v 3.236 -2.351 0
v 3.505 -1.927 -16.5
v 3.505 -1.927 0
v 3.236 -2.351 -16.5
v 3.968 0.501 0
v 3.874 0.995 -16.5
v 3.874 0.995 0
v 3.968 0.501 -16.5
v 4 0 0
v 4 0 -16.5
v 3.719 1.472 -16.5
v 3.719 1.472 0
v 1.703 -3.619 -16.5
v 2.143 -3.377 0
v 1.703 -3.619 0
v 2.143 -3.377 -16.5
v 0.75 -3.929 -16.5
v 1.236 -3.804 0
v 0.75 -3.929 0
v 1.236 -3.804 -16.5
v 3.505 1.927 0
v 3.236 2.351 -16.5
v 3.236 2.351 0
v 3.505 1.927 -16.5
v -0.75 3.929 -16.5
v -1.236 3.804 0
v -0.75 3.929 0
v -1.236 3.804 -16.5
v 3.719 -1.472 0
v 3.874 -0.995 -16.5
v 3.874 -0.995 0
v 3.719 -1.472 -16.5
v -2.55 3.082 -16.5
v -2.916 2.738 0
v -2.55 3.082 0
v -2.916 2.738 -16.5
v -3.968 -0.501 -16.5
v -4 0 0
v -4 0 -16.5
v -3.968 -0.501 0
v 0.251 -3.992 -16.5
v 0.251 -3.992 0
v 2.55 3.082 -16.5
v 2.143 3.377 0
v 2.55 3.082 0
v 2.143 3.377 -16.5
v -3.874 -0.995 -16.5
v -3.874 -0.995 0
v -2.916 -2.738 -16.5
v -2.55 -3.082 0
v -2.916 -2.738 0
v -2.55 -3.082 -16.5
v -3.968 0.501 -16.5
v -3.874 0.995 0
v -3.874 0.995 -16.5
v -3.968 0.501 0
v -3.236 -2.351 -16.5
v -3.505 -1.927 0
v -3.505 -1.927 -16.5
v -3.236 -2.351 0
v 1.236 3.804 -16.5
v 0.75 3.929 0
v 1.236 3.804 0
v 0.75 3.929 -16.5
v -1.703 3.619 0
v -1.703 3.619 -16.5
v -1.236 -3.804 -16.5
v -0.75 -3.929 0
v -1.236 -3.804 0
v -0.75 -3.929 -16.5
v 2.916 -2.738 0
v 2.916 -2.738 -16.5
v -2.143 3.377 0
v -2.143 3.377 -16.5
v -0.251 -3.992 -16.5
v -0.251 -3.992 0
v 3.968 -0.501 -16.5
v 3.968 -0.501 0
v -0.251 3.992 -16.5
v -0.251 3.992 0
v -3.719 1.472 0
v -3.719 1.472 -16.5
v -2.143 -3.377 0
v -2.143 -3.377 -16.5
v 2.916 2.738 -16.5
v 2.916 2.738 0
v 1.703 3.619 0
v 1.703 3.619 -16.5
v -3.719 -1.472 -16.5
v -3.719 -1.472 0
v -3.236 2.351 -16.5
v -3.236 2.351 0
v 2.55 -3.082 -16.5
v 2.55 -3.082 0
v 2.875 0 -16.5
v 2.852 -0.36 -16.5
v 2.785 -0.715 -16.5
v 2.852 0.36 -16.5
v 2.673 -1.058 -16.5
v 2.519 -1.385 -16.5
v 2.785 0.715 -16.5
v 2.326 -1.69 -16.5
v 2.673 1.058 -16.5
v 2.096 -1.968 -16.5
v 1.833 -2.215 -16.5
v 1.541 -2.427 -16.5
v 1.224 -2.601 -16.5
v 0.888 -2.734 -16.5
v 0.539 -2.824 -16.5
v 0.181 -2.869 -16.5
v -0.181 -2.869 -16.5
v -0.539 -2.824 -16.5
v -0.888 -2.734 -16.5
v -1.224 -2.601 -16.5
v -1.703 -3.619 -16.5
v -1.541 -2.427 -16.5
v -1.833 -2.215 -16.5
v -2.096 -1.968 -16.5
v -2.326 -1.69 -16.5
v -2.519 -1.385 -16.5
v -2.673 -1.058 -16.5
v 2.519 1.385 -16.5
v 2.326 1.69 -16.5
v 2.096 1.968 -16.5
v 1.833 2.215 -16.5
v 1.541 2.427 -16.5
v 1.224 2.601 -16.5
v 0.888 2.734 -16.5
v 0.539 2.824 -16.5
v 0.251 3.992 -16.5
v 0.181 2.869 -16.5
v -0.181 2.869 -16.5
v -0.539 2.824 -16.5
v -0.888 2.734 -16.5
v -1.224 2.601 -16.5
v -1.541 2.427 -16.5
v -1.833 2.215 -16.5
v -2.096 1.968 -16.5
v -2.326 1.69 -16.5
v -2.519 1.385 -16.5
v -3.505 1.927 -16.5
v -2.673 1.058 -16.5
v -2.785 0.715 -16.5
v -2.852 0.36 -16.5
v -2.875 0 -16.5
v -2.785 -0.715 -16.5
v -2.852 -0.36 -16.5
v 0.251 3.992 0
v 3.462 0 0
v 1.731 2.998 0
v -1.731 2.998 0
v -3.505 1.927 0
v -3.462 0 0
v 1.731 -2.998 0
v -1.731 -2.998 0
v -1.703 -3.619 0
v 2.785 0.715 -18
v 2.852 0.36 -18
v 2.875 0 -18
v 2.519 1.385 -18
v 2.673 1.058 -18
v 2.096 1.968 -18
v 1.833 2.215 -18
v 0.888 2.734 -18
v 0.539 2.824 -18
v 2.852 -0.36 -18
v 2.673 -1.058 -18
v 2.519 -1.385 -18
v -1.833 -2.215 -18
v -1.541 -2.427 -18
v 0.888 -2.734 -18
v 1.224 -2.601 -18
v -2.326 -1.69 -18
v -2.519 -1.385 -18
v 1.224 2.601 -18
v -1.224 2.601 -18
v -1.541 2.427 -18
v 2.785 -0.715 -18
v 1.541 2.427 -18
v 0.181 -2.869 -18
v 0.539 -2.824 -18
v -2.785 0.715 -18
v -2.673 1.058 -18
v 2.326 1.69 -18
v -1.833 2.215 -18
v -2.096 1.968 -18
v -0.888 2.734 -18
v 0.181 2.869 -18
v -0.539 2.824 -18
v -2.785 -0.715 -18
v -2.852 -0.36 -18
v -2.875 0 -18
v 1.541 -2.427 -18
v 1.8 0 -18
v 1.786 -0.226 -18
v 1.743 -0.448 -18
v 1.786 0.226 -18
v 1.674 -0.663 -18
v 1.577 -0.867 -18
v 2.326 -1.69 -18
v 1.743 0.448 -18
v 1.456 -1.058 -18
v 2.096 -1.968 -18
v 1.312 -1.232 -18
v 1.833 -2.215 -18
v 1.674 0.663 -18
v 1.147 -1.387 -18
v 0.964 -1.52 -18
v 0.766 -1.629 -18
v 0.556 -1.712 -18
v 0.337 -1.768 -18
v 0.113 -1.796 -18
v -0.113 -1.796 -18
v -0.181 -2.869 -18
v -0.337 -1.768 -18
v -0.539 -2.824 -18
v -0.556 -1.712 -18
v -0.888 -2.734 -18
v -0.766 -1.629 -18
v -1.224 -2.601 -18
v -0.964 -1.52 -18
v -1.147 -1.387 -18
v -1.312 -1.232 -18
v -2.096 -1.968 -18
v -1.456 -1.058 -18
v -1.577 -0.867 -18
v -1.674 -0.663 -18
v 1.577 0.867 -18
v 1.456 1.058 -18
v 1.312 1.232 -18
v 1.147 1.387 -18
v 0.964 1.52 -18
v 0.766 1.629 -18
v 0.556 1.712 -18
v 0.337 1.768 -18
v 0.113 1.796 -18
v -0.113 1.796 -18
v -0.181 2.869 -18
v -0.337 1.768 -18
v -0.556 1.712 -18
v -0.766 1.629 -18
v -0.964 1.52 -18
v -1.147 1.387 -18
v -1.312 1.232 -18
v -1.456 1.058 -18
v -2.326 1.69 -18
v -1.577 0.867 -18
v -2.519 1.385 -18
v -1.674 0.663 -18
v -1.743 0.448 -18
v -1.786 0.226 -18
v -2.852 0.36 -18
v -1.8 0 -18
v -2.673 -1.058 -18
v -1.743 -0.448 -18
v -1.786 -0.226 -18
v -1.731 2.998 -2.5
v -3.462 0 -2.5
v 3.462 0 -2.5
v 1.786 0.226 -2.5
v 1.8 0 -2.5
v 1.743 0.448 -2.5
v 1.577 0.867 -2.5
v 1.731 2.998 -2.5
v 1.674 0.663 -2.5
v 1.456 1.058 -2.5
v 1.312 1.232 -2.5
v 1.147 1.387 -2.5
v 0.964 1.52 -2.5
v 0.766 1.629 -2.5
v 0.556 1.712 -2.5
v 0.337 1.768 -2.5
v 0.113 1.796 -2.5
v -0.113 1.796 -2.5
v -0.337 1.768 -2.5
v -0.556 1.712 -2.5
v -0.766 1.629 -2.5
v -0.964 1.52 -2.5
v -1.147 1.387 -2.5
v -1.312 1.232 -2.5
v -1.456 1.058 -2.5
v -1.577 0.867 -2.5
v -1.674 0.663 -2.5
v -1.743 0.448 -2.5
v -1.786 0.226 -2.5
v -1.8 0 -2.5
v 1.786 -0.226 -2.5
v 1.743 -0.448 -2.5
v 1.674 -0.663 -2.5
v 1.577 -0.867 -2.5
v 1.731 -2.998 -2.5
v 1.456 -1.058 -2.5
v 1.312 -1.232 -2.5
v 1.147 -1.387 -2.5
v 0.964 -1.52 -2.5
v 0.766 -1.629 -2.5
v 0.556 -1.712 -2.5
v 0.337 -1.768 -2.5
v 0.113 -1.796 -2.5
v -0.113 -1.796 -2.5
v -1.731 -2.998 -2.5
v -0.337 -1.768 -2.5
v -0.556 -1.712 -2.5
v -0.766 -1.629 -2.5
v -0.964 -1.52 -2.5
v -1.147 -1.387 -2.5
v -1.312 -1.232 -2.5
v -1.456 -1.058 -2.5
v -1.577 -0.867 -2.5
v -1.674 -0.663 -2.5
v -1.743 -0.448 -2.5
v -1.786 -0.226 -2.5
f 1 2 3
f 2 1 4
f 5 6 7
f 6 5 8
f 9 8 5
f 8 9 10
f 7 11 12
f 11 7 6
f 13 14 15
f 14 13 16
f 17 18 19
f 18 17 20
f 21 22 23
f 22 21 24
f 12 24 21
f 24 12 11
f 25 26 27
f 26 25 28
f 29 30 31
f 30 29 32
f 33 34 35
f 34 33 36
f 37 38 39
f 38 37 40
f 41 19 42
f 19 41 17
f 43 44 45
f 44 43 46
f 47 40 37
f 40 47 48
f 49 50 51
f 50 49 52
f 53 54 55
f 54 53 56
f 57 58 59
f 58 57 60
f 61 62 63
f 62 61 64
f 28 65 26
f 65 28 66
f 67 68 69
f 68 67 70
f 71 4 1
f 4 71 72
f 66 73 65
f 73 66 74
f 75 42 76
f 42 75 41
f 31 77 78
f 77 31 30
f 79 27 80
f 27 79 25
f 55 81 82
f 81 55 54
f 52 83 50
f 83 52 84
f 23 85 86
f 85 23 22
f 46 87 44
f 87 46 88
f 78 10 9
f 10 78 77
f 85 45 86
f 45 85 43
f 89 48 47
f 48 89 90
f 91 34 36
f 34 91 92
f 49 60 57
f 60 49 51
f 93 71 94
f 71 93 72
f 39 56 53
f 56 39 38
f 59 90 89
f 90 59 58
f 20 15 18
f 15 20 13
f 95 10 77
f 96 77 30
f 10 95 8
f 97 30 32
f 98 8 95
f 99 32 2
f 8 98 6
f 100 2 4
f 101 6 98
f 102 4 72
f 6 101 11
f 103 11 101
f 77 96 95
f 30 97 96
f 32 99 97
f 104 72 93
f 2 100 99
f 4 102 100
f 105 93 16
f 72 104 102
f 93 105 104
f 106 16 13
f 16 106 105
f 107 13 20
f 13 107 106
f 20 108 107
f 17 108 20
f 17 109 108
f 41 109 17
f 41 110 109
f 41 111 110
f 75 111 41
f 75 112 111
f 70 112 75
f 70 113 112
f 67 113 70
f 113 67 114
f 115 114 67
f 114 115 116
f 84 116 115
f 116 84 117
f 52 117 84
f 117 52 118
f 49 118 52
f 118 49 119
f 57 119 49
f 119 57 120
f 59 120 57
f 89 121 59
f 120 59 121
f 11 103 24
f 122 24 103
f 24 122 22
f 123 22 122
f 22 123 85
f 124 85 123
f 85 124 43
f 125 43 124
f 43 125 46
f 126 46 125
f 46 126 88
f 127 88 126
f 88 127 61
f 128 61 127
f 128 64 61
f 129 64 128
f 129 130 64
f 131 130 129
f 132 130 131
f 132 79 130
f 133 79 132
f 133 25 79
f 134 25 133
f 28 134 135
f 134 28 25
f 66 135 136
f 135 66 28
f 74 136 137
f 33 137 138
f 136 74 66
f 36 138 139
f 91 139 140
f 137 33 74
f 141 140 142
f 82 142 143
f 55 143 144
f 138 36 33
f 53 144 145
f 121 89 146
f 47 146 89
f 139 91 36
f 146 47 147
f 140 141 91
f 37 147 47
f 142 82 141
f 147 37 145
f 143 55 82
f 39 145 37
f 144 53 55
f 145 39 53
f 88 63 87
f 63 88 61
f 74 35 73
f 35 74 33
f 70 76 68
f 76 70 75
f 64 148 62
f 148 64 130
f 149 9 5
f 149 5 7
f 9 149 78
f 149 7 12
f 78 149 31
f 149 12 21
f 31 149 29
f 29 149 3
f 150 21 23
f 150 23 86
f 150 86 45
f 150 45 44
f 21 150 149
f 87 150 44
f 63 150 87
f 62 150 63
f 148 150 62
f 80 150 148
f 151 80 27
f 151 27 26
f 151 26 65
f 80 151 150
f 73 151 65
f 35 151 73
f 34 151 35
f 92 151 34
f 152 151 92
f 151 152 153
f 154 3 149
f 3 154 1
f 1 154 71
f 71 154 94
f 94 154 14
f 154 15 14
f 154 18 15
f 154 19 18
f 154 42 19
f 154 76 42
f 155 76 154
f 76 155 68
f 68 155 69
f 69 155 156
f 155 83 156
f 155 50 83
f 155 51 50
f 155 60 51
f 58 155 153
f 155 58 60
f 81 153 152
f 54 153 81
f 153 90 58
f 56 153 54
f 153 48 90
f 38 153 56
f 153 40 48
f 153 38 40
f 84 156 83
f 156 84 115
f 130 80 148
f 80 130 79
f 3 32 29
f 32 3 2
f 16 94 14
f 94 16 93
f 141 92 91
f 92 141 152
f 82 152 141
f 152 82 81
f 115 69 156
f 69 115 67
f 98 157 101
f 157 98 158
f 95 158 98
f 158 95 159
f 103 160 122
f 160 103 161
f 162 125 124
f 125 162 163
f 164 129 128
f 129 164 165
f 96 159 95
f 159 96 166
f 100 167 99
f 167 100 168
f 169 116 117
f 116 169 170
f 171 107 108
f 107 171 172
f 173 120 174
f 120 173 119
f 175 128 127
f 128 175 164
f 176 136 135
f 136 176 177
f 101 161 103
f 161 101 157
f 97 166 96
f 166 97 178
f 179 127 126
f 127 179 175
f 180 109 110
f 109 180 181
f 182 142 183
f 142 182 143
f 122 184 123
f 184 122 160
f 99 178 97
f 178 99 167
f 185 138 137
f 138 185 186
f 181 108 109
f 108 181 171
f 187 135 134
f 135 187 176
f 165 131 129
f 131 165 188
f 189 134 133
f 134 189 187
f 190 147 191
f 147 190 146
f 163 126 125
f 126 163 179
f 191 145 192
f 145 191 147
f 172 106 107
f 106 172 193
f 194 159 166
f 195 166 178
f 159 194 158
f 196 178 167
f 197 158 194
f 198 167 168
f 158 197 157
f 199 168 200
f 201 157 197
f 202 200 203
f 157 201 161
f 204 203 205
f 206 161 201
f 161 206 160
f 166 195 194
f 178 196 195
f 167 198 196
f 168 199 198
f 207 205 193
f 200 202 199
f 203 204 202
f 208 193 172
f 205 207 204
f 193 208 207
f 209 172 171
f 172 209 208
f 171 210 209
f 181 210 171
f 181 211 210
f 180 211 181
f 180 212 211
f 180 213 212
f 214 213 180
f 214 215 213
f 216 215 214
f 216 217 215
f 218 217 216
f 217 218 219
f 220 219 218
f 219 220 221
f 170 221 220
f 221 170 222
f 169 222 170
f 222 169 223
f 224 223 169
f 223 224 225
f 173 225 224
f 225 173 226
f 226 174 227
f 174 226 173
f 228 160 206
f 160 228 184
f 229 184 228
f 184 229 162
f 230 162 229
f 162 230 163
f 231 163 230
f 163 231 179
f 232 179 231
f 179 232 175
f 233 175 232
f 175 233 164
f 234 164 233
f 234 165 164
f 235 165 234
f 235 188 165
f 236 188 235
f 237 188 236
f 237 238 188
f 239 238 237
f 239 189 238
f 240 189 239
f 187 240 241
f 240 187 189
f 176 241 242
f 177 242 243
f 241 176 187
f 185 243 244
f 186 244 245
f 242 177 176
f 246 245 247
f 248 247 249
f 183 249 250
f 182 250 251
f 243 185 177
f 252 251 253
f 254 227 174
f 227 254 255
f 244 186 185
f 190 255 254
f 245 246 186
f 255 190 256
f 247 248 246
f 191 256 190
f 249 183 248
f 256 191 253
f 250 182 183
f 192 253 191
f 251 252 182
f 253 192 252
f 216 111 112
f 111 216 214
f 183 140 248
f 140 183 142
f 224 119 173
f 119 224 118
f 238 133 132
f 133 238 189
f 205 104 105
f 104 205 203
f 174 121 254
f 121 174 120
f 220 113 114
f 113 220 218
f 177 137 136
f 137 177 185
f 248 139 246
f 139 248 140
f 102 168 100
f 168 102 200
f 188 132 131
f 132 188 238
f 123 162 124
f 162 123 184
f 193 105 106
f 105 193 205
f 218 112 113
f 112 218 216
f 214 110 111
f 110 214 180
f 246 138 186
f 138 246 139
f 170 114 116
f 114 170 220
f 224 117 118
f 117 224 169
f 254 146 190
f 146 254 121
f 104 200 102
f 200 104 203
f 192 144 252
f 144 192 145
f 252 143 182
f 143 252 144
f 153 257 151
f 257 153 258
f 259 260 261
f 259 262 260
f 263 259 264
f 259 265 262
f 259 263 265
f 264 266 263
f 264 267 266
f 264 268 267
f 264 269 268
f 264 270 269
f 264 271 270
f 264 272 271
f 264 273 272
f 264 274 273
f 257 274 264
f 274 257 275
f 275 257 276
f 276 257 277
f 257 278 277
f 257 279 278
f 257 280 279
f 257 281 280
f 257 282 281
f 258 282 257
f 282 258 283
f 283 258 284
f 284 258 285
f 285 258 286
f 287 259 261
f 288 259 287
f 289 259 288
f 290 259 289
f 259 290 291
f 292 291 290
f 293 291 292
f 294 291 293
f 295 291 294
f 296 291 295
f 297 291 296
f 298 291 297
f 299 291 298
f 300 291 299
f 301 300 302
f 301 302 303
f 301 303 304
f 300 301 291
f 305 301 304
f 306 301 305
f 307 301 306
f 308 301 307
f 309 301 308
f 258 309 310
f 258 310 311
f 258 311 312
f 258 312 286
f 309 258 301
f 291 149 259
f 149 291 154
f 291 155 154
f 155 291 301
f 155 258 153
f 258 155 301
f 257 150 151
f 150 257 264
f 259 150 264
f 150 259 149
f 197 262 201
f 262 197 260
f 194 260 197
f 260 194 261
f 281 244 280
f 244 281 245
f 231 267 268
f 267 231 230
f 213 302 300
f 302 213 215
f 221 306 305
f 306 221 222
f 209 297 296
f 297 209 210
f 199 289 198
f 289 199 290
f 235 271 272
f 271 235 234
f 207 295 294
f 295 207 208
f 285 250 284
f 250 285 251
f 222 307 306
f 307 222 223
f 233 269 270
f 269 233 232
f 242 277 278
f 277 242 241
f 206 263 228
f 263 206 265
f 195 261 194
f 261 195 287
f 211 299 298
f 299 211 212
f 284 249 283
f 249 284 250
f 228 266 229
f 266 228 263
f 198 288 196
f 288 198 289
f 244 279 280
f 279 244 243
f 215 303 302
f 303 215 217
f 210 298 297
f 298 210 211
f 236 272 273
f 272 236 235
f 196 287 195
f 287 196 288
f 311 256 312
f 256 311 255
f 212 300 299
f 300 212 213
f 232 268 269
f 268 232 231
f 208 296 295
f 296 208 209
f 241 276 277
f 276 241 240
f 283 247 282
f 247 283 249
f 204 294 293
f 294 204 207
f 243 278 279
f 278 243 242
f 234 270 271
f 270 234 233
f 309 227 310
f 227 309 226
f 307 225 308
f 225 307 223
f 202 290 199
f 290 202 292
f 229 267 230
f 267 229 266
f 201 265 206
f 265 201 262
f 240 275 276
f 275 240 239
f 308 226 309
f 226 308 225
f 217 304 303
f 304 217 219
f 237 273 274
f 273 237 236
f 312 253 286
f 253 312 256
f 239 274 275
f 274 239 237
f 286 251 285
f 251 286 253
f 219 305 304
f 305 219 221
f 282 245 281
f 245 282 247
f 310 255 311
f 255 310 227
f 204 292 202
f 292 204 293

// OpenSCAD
$fn = 50;

difference() {
	union() {
		translate(v = [0, 0, -16.5]) {
			cylinder(h = 16.5, r = 4.0);
		}
		#translate(v = [0, 0, -18.0]) {
			cylinder(h = 18, r = 2.875);
		}
	}
	union() {
		translate(v = [0, 0, 0]) {
			rotate(a = [0, 0, 0]) {
				difference() {
					union() {
						translate(v = [0, 0, -2.5]) {
							linear_extrude(height = 2.5) {
								polygon(points = [[3.4619999999999997, 0.0], [1.7310000000000003, 2.9981799479017264], [-1.7309999999999992, 2.9981799479017264], [-3.4619999999999997, 4.2397272186481365e-16], [-1.7310000000000014, -2.998179947901726], [1.7309999999999977, -2.9981799479017277]]);
							}
						}
					}
					union();
				}
			}
		}
		#translate(v = [0, 0, -100.0]) {
			cylinder(h = 200, r = 1.8);
		}
	}
}
